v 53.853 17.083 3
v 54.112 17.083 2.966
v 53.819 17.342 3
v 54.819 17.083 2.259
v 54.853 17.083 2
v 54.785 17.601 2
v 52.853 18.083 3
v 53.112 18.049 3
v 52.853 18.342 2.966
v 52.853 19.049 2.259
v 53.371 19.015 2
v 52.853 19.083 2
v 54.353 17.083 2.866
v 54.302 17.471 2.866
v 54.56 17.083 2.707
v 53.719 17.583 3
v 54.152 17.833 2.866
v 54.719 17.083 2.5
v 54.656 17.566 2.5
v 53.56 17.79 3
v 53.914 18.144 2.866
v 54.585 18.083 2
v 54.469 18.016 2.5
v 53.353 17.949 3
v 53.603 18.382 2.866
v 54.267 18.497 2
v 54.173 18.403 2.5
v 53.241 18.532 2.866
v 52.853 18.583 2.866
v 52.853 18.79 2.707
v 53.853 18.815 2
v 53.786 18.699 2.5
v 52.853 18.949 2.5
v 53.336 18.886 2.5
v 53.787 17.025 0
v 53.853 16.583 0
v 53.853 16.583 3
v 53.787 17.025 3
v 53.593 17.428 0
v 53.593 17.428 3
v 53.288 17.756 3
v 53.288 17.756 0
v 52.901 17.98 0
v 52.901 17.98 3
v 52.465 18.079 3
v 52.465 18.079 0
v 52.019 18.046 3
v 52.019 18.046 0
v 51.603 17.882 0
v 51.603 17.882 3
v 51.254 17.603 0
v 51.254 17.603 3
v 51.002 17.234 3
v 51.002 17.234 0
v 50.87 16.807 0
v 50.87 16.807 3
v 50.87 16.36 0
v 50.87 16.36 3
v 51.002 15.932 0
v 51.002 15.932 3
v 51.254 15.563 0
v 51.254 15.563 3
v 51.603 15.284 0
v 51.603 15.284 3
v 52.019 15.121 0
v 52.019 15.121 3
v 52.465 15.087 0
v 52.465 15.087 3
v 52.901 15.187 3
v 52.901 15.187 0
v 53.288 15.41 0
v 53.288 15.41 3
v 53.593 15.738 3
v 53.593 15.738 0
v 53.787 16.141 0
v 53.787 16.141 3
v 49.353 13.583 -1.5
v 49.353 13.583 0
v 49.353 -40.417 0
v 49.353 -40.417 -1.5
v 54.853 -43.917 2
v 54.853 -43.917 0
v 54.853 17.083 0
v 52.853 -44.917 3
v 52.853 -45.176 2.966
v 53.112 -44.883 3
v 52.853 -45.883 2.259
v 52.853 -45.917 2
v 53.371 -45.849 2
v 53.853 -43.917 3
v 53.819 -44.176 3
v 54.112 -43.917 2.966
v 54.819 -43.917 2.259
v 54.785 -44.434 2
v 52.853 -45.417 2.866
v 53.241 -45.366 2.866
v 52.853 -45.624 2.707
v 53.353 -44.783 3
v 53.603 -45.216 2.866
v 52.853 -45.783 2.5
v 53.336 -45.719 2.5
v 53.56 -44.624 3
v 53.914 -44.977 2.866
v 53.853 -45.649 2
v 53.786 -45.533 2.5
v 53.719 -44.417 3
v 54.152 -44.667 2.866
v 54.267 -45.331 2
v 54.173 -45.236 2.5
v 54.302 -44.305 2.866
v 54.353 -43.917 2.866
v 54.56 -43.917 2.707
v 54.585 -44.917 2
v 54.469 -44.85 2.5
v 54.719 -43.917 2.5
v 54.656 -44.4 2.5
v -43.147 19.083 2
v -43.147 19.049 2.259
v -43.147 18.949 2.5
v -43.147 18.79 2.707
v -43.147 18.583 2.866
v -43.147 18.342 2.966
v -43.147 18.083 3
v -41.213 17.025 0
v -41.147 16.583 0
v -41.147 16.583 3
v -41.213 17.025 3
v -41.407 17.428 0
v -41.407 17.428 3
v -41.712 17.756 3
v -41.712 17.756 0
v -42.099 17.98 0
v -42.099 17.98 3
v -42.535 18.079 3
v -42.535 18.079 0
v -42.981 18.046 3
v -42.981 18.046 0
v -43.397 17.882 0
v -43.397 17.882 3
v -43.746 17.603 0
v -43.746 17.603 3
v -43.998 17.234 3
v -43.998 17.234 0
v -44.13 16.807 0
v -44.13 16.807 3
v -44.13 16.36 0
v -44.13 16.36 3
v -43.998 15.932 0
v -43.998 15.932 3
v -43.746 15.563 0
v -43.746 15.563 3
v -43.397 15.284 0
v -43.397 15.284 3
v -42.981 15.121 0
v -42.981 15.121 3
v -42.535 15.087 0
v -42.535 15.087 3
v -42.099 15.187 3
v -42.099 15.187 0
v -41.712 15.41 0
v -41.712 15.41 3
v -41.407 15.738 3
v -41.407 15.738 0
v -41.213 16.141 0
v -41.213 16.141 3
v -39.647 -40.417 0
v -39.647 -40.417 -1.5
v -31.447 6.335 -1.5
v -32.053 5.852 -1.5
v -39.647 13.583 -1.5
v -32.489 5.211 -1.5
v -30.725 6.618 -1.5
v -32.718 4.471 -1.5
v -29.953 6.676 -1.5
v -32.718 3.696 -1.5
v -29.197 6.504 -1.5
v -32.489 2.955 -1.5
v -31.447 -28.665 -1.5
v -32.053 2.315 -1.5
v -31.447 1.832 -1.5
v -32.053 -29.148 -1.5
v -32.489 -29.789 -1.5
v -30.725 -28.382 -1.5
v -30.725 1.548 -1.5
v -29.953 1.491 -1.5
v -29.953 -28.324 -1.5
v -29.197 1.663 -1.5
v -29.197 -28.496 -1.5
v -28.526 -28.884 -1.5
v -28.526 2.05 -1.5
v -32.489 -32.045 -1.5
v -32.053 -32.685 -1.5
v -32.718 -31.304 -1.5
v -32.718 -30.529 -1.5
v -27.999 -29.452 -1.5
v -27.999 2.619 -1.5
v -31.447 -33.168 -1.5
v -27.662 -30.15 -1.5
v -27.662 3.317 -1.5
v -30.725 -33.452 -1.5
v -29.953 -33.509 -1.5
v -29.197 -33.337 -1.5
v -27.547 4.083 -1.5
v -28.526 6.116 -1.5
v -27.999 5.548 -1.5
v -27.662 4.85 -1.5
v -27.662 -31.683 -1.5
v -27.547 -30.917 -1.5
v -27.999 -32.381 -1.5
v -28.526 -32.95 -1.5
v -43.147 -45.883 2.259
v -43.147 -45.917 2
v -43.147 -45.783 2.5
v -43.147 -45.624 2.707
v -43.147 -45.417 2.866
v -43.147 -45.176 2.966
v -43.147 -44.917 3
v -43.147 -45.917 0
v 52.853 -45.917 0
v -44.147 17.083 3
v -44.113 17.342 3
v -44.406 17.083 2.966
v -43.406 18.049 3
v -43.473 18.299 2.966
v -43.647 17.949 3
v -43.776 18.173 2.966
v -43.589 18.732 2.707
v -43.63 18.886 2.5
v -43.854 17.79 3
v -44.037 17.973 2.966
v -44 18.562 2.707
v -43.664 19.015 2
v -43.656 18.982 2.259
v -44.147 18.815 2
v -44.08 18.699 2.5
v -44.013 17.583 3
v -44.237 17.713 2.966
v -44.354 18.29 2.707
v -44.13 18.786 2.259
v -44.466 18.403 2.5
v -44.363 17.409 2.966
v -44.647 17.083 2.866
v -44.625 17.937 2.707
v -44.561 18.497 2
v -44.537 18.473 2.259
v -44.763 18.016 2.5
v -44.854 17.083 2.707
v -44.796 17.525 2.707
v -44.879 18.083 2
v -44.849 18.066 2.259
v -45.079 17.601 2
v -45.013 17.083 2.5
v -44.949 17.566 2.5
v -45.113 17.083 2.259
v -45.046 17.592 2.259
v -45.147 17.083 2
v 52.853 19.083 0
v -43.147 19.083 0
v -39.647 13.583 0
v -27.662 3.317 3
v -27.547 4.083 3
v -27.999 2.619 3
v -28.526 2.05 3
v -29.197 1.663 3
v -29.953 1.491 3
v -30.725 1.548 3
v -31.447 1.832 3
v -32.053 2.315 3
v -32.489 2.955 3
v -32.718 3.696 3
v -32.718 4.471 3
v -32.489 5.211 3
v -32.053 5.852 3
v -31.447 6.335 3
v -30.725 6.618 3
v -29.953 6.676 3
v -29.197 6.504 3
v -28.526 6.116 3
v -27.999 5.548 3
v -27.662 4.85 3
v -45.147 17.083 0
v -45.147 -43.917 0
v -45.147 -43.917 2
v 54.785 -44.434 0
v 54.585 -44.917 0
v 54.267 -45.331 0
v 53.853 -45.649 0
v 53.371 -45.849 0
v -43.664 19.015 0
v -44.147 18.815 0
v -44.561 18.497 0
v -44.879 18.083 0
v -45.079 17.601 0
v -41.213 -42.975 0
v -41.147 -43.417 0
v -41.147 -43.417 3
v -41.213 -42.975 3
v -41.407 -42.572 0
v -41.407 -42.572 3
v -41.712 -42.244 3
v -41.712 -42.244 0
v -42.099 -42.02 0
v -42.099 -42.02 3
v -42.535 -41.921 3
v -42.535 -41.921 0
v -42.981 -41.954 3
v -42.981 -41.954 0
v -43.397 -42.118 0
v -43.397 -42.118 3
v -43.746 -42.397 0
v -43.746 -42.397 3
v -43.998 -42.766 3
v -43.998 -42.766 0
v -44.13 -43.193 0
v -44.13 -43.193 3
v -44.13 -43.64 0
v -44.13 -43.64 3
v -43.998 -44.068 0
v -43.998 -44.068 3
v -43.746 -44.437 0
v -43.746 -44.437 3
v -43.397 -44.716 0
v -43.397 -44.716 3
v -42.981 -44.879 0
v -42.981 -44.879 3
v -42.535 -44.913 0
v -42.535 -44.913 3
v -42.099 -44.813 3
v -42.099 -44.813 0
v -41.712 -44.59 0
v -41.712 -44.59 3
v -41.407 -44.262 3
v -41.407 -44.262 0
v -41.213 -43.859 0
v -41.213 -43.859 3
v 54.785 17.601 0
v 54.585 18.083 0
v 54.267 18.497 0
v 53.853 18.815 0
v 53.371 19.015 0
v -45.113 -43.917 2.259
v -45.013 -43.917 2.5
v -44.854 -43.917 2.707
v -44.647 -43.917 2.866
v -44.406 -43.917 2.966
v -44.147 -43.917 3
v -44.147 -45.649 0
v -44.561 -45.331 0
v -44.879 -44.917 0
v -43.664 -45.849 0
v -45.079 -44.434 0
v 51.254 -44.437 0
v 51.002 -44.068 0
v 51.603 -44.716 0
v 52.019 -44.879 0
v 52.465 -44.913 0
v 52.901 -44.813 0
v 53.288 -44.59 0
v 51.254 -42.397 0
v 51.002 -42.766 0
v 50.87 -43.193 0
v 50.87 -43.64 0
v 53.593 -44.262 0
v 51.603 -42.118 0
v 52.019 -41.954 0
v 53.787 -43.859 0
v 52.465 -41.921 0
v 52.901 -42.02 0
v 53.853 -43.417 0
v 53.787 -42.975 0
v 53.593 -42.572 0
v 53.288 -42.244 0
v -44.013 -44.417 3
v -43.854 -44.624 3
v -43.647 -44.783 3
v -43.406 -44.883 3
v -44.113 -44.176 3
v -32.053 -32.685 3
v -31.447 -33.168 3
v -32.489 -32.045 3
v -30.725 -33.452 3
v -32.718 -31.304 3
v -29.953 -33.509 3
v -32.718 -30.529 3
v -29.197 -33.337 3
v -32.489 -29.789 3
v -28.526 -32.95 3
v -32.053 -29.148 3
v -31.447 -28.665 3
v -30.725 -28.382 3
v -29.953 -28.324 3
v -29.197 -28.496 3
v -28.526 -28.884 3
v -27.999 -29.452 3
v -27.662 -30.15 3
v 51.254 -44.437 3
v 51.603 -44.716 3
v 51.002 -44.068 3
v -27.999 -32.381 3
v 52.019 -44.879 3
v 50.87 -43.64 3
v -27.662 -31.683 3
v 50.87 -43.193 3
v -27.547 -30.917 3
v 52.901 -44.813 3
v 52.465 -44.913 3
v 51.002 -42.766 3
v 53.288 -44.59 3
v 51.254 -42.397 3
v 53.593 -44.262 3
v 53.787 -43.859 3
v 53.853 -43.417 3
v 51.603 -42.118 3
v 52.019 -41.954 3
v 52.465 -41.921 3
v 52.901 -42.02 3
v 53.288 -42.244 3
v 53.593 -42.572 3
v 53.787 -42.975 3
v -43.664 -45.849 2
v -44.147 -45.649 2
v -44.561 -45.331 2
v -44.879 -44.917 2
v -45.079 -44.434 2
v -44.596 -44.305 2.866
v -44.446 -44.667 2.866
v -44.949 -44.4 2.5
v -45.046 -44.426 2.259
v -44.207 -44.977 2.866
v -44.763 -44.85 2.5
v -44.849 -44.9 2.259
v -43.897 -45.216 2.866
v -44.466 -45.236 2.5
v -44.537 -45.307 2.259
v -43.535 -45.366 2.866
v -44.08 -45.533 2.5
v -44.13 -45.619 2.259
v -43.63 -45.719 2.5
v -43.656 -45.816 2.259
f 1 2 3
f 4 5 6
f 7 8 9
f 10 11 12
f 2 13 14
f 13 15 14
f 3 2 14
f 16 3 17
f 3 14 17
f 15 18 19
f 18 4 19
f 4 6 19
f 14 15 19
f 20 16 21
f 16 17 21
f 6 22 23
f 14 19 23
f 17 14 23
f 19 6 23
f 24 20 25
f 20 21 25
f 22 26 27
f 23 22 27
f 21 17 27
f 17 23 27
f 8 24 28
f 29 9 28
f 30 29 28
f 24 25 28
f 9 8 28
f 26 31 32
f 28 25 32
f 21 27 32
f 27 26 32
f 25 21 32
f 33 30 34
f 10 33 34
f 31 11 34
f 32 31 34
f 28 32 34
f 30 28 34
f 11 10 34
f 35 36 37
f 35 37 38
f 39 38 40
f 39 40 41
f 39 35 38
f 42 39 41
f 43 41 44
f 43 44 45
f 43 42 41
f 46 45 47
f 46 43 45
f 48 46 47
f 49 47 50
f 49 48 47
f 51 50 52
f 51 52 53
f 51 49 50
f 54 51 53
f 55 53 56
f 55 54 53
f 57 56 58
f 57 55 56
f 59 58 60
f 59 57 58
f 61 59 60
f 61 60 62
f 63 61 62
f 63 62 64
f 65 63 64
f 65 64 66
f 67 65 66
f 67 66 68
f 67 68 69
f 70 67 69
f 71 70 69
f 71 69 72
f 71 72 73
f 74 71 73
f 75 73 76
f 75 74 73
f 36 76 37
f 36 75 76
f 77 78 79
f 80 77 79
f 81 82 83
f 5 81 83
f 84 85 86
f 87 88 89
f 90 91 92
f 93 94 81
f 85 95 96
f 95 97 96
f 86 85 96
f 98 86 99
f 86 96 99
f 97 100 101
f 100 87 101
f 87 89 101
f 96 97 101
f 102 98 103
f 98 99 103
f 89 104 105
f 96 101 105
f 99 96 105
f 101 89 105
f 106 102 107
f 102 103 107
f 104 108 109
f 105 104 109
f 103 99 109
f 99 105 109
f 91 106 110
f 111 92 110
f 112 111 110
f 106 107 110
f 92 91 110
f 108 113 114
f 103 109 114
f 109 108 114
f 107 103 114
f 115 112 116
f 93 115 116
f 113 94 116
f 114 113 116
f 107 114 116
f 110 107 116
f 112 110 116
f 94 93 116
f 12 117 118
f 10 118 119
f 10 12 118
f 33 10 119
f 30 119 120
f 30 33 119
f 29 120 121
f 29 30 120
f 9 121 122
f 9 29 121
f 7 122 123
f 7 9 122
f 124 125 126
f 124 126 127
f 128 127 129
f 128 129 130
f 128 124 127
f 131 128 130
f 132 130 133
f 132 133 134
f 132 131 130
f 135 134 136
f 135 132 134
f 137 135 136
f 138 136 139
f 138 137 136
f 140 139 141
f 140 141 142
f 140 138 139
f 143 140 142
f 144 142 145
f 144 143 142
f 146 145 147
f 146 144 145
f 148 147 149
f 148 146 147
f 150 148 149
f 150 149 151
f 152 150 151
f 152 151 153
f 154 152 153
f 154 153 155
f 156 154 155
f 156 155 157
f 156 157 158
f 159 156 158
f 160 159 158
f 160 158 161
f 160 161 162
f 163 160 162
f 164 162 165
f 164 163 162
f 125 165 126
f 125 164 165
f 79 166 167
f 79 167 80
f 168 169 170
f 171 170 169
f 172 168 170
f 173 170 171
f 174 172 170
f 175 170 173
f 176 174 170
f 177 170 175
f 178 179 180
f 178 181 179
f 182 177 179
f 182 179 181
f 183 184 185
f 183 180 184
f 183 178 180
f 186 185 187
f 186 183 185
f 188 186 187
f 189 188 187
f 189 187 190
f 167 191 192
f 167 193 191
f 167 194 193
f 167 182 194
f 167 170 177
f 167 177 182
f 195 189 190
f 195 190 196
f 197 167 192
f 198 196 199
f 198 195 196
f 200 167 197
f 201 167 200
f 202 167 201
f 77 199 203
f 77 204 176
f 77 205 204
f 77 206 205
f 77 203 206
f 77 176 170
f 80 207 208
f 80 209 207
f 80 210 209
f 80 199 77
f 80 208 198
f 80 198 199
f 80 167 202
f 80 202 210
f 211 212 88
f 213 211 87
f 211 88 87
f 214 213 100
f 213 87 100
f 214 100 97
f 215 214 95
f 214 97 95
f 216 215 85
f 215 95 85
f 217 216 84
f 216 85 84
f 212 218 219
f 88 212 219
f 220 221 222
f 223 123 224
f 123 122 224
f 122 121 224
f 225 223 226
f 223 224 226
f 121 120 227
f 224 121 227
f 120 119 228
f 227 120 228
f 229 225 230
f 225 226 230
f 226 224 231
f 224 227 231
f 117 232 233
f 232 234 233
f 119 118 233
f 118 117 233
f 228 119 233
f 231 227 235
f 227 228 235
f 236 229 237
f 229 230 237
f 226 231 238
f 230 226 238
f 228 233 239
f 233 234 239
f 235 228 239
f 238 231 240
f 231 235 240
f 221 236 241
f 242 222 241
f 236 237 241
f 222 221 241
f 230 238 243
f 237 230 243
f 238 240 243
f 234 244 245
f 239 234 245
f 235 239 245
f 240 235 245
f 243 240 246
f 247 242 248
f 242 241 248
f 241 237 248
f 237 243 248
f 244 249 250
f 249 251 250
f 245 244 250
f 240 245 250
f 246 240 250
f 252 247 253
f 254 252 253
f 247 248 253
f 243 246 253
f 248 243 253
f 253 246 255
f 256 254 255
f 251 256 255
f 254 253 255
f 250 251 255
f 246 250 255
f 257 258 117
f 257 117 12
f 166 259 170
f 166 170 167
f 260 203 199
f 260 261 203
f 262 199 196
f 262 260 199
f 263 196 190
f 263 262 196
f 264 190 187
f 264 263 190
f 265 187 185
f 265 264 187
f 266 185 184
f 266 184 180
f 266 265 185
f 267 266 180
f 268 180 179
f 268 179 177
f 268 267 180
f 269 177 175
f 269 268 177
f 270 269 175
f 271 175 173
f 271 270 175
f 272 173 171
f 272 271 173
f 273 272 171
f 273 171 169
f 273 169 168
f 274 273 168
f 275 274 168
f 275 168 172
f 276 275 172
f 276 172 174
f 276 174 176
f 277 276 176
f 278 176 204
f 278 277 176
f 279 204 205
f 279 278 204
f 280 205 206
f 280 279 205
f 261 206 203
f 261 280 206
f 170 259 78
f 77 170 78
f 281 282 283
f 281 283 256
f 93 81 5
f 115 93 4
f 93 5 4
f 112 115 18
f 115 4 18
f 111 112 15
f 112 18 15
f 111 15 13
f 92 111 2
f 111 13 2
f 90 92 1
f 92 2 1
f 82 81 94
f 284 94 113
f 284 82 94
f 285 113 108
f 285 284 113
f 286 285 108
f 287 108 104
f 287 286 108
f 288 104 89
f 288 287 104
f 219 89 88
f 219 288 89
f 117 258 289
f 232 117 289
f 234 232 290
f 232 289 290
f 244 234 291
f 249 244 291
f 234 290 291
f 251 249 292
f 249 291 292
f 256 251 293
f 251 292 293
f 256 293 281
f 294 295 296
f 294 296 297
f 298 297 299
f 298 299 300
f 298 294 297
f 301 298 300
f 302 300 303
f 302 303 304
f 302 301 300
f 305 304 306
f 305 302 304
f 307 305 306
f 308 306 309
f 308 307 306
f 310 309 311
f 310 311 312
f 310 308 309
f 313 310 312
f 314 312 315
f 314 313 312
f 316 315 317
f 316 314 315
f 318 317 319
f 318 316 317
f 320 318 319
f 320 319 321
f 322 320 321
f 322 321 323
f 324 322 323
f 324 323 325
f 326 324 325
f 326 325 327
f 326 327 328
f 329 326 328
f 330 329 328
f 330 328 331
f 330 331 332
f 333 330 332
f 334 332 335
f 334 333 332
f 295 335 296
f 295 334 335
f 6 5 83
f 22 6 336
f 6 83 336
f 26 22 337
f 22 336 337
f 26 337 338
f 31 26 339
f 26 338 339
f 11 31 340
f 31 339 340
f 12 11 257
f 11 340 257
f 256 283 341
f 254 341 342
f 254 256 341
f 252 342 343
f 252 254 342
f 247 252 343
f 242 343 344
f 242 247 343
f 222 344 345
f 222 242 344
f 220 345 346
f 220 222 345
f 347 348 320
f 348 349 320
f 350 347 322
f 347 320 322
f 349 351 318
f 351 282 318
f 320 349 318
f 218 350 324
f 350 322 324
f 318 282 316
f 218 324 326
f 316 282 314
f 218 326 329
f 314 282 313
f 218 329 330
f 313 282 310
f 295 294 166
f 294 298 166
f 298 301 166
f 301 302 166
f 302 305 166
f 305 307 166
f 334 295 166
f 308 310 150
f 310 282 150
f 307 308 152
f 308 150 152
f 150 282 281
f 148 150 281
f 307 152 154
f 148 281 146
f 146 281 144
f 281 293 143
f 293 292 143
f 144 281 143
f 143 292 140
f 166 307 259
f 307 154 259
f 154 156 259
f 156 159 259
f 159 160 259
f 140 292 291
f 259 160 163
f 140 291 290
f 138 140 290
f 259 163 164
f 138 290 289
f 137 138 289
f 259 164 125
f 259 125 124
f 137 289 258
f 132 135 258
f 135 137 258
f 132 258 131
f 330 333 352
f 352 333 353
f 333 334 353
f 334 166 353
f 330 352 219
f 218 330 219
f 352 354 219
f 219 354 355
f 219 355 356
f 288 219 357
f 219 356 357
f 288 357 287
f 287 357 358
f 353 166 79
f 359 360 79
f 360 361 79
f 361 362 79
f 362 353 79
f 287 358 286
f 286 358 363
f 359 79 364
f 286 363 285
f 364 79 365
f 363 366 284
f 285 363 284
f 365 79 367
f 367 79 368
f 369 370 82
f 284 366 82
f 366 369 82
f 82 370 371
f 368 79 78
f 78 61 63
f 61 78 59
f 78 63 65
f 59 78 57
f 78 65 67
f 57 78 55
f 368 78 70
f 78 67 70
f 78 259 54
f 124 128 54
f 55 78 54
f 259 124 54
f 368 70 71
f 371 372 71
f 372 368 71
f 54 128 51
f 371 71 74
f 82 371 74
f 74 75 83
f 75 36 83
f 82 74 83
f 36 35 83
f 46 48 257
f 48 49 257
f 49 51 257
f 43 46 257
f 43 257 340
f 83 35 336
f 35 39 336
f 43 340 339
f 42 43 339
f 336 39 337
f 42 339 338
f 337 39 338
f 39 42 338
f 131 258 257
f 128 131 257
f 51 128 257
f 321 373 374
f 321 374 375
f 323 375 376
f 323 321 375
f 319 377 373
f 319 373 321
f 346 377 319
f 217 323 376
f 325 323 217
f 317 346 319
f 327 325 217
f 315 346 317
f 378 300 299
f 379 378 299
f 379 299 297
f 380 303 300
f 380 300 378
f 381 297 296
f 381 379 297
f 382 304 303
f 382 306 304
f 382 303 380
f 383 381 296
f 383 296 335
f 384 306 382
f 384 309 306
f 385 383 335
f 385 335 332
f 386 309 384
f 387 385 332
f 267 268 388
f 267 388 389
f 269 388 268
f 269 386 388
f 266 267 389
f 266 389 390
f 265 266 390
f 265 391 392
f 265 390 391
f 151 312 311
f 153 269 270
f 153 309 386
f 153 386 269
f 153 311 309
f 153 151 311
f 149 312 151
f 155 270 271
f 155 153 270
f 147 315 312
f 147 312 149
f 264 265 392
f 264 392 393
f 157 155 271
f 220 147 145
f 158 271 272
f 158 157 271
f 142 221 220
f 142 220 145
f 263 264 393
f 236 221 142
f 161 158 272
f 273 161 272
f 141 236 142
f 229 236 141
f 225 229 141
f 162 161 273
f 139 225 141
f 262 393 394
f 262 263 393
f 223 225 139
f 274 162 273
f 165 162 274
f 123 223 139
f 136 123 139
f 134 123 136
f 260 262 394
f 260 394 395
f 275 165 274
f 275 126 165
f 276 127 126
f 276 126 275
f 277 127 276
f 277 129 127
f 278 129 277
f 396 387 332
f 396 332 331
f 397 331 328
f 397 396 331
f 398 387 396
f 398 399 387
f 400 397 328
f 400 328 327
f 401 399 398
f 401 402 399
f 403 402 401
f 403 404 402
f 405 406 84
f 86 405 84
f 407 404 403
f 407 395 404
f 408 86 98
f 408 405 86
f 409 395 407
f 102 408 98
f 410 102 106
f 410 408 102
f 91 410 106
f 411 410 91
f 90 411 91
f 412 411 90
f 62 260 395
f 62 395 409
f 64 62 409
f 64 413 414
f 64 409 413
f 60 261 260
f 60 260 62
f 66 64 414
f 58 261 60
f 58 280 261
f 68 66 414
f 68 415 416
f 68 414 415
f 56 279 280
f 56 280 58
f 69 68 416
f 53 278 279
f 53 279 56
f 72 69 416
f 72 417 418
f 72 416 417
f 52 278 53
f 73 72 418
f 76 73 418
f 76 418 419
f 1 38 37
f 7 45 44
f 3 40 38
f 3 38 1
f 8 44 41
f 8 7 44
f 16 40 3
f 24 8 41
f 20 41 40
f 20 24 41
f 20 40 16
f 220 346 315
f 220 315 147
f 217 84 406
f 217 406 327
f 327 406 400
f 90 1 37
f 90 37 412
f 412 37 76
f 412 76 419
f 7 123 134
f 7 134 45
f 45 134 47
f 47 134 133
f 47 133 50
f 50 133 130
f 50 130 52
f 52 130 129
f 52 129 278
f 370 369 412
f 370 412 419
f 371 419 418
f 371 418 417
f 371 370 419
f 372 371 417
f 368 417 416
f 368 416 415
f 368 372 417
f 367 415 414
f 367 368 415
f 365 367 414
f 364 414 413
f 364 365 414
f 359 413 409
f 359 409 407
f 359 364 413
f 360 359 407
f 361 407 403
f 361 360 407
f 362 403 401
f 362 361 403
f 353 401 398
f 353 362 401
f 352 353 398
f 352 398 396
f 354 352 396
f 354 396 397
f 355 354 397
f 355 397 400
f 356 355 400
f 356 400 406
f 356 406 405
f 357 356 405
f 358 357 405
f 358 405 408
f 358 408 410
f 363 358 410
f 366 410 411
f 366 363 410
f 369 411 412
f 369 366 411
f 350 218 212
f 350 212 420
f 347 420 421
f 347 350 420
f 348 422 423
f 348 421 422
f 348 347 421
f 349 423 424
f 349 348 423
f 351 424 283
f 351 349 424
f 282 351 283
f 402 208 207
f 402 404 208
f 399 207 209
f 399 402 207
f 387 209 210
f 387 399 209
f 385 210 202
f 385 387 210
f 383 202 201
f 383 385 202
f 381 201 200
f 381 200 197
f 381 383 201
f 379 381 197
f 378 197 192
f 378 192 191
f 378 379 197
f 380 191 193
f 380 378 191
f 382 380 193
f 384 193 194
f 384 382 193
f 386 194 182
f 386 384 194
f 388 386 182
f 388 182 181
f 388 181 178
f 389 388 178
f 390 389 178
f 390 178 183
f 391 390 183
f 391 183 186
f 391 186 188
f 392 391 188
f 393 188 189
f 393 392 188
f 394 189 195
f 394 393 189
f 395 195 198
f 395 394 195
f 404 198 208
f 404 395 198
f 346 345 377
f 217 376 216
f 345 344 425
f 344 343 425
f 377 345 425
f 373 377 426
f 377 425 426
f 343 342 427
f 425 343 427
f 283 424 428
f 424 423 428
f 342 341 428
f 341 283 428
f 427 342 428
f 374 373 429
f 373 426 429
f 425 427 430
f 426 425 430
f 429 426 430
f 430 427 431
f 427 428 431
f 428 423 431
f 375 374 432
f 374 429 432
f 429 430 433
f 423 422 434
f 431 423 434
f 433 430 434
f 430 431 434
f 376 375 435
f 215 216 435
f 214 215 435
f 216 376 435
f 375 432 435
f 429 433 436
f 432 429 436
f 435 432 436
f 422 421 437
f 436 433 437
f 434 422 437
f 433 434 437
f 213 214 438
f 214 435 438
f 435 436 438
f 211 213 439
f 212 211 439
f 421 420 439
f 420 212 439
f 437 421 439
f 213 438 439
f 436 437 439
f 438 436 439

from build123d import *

# Parameters (mm, degrees)
F0_W         = 100
F0_H         = 65
F0_R         = 1.5
F0_R_2       = 2.6
F1_DEPTH     = 3
F2_R         = 0.99999
F3_T1_DEPTH  = 8
F3_T4_ANGLE  = 90
F3_T6_ANGLE  = 90
F3_T8_ANGLE  = 90
F3_T10_ANGLE = 90
F4_W         = 89
F4_H         = 54
F4_R         = 2.6
F5_DEPTH     = 1.5


# Not quite as in the source:
# - a fillet or chamfer that OpenCascade refuses, or shapes differently, is made with other operations: its cross-section is extruded or revolved along the edge and cut away or added
# - a fillet or chamfer is up to 0.001 mm smaller than in the source, because OpenCascade refuses the exact size


with BuildPart() as f1:
    # F0 (on Top) → F1 (new body)
    with BuildSketch(Plane.XY):
        with Locations((4.8531983048, -13.4167700263)):
            Rectangle(F0_W, F0_H)
        with Locations((-42.6468016952, -43.4167700263)):
            Circle(F0_R, mode=Mode.SUBTRACT)
        with Locations((-30.1468016952, -30.9167700263)):
            Circle(F0_R_2, mode=Mode.SUBTRACT)
        with Locations((52.3531983048, -43.4167700263)):
            Circle(F0_R, mode=Mode.SUBTRACT)
        with Locations((-30.1468016952, 4.0832299737)):
            Circle(F0_R_2, mode=Mode.SUBTRACT)
        with Locations((-42.6468016952, 16.5832299737)):
            Circle(F0_R, mode=Mode.SUBTRACT)
        with Locations((52.3531983048, 16.5832299737)):
            Circle(F0_R, mode=Mode.SUBTRACT)
    extrude(amount=F1_DEPTH)

    # F2 (radius 1 in the source; OpenCascade refuses exactly that, so slightly less here)
    f2_edges = [f1.edges().sort_by_distance(p)[0] for p in [
        (-45.146802, -13.41677, 3),
        (4.853198, 19.08323, 3),
        (54.853198, -13.41677, 3),
        (4.853198, -45.91677, 3),
    ]]
    fillet(f2_edges, radius=F2_R)

    # F3: fillet of radius 2 on 4 edges, made by hand

    # F3_s2 → F3_t1 (cut)
    with BuildSketch(Plane.XY.offset(-5)):
        with BuildLine():
            ThreePointArc((-43.1468016952, -45.9167700263), (-44.5610152576, -45.3309835887), (-45.1468016952, -43.9167700263))
            Line((-45.1468016952, -43.9167700263), (-45.1468016952, -45.9167700263))
            Line((-45.1468016952, -45.9167700263), (-43.1468016952, -45.9167700263))
        make_face()
        with BuildLine():
            ThreePointArc((-43.1468016952, 19.0832299737), (-44.5610152576, 18.4974435361), (-45.1468016952, 17.0832299737))
            Line((-45.1468016952, 17.0832299737), (-45.1468016952, 19.0832299737))
            Line((-45.1468016952, 19.0832299737), (-43.1468016952, 19.0832299737))
        make_face()
        with BuildLine():
            ThreePointArc((54.8531983048, 17.0832299737), (54.2674118671, 18.4974435361), (52.8531983048, 19.0832299737))
            Line((52.8531983048, 19.0832299737), (54.8531983048, 19.0832299737))
            Line((54.8531983048, 19.0832299737), (54.8531983048, 17.0832299737))
        make_face()
        with BuildLine():
            ThreePointArc((54.8531983048, -43.9167700263), (54.2674118671, -45.3309835887), (52.8531983048, -45.9167700263))
            Line((52.8531983048, -45.9167700263), (54.8531983048, -45.9167700263))
            Line((54.8531983048, -45.9167700263), (54.8531983048, -43.9167700263))
        make_face()
    extrude(amount=F3_T1_DEPTH, mode=Mode.SUBTRACT)

    # F3_s3 → F3_t4 (revolve, cut)
    with BuildSketch(Plane.YZ.offset(52.8531983048)):
        with BuildLine():
            ThreePointArc((-44.9167800263, 3), (-45.6238797364, 2.7071097101), (-45.9167700263, 2.00001))
            Line((-45.9167700263, 2.00001), (-45.9167700263, 3))
            Line((-45.9167700263, 3), (-44.9167800263, 3))
        make_face()
    revolve(axis=Axis((52.8531983048, -43.9167700263, 3), (0, 0, 1)), revolution_arc=F3_T4_ANGLE, mode=Mode.SUBTRACT)

    # F3_s5 → F3_t6 (revolve, cut)
    with BuildSketch(Plane.XZ.offset(-17.0832299737)):
        with BuildLine():
            ThreePointArc((53.8532083048, 3), (54.5603080149, 2.7071097101), (54.8531983048, 2.00001))
            Line((54.8531983048, 2.00001), (54.8531983048, 3))
            Line((54.8531983048, 3), (53.8532083048, 3))
        make_face()
    revolve(axis=Axis((52.8531983048, 17.0832299737, 3), (0, 0, 1)), revolution_arc=F3_T6_ANGLE, mode=Mode.SUBTRACT)

    # F3_s7 → F3_t8 (revolve, cut)
    with BuildSketch(Plane.YZ.offset(-43.1468016952)):
        with BuildLine():
            ThreePointArc((18.0832399737, 3), (18.7903396838, 2.7071097101), (19.0832299737, 2.00001))
            Line((19.0832299737, 2.00001), (19.0832299737, 3))
            Line((19.0832299737, 3), (18.0832399737, 3))
        make_face()
    revolve(axis=Axis((-43.1468016952, 17.0832299737, 3), (0, 0, 1)), revolution_arc=F3_T8_ANGLE, mode=Mode.SUBTRACT)

    # F3_s9 → F3_t10 (revolve, cut)
    with BuildSketch(Plane.XZ.offset(43.9167700263)):
        with BuildLine():
            ThreePointArc((-44.1468116952, 3), (-44.8539114053, 2.7071097101), (-45.1468016952, 2.00001))
            Line((-45.1468016952, 2.00001), (-45.1468016952, 3))
            Line((-45.1468016952, 3), (-44.1468116952, 3))
        make_face()
    revolve(axis=Axis((-43.1468016952, -43.9167700263, 3), (0, 0, 1)), revolution_arc=F3_T10_ANGLE, mode=Mode.SUBTRACT)

    # F4 (on face) → F5 (join)
    with BuildSketch(Plane(origin=(0, 0, 0), x_dir=(1, 0, 0), z_dir=(0, 0, -1))):
        with Locations((4.8531983048, 13.4167700263)):
            Rectangle(F4_W, F4_H)
        with Locations((-30.1468016952, -4.0832299737)):
            Circle(F4_R, mode=Mode.SUBTRACT)
        with Locations((-30.1468016952, 30.9167700263)):
            Circle(F4_R, mode=Mode.SUBTRACT)
    extrude(amount=F5_DEPTH)


solid = f1.part
